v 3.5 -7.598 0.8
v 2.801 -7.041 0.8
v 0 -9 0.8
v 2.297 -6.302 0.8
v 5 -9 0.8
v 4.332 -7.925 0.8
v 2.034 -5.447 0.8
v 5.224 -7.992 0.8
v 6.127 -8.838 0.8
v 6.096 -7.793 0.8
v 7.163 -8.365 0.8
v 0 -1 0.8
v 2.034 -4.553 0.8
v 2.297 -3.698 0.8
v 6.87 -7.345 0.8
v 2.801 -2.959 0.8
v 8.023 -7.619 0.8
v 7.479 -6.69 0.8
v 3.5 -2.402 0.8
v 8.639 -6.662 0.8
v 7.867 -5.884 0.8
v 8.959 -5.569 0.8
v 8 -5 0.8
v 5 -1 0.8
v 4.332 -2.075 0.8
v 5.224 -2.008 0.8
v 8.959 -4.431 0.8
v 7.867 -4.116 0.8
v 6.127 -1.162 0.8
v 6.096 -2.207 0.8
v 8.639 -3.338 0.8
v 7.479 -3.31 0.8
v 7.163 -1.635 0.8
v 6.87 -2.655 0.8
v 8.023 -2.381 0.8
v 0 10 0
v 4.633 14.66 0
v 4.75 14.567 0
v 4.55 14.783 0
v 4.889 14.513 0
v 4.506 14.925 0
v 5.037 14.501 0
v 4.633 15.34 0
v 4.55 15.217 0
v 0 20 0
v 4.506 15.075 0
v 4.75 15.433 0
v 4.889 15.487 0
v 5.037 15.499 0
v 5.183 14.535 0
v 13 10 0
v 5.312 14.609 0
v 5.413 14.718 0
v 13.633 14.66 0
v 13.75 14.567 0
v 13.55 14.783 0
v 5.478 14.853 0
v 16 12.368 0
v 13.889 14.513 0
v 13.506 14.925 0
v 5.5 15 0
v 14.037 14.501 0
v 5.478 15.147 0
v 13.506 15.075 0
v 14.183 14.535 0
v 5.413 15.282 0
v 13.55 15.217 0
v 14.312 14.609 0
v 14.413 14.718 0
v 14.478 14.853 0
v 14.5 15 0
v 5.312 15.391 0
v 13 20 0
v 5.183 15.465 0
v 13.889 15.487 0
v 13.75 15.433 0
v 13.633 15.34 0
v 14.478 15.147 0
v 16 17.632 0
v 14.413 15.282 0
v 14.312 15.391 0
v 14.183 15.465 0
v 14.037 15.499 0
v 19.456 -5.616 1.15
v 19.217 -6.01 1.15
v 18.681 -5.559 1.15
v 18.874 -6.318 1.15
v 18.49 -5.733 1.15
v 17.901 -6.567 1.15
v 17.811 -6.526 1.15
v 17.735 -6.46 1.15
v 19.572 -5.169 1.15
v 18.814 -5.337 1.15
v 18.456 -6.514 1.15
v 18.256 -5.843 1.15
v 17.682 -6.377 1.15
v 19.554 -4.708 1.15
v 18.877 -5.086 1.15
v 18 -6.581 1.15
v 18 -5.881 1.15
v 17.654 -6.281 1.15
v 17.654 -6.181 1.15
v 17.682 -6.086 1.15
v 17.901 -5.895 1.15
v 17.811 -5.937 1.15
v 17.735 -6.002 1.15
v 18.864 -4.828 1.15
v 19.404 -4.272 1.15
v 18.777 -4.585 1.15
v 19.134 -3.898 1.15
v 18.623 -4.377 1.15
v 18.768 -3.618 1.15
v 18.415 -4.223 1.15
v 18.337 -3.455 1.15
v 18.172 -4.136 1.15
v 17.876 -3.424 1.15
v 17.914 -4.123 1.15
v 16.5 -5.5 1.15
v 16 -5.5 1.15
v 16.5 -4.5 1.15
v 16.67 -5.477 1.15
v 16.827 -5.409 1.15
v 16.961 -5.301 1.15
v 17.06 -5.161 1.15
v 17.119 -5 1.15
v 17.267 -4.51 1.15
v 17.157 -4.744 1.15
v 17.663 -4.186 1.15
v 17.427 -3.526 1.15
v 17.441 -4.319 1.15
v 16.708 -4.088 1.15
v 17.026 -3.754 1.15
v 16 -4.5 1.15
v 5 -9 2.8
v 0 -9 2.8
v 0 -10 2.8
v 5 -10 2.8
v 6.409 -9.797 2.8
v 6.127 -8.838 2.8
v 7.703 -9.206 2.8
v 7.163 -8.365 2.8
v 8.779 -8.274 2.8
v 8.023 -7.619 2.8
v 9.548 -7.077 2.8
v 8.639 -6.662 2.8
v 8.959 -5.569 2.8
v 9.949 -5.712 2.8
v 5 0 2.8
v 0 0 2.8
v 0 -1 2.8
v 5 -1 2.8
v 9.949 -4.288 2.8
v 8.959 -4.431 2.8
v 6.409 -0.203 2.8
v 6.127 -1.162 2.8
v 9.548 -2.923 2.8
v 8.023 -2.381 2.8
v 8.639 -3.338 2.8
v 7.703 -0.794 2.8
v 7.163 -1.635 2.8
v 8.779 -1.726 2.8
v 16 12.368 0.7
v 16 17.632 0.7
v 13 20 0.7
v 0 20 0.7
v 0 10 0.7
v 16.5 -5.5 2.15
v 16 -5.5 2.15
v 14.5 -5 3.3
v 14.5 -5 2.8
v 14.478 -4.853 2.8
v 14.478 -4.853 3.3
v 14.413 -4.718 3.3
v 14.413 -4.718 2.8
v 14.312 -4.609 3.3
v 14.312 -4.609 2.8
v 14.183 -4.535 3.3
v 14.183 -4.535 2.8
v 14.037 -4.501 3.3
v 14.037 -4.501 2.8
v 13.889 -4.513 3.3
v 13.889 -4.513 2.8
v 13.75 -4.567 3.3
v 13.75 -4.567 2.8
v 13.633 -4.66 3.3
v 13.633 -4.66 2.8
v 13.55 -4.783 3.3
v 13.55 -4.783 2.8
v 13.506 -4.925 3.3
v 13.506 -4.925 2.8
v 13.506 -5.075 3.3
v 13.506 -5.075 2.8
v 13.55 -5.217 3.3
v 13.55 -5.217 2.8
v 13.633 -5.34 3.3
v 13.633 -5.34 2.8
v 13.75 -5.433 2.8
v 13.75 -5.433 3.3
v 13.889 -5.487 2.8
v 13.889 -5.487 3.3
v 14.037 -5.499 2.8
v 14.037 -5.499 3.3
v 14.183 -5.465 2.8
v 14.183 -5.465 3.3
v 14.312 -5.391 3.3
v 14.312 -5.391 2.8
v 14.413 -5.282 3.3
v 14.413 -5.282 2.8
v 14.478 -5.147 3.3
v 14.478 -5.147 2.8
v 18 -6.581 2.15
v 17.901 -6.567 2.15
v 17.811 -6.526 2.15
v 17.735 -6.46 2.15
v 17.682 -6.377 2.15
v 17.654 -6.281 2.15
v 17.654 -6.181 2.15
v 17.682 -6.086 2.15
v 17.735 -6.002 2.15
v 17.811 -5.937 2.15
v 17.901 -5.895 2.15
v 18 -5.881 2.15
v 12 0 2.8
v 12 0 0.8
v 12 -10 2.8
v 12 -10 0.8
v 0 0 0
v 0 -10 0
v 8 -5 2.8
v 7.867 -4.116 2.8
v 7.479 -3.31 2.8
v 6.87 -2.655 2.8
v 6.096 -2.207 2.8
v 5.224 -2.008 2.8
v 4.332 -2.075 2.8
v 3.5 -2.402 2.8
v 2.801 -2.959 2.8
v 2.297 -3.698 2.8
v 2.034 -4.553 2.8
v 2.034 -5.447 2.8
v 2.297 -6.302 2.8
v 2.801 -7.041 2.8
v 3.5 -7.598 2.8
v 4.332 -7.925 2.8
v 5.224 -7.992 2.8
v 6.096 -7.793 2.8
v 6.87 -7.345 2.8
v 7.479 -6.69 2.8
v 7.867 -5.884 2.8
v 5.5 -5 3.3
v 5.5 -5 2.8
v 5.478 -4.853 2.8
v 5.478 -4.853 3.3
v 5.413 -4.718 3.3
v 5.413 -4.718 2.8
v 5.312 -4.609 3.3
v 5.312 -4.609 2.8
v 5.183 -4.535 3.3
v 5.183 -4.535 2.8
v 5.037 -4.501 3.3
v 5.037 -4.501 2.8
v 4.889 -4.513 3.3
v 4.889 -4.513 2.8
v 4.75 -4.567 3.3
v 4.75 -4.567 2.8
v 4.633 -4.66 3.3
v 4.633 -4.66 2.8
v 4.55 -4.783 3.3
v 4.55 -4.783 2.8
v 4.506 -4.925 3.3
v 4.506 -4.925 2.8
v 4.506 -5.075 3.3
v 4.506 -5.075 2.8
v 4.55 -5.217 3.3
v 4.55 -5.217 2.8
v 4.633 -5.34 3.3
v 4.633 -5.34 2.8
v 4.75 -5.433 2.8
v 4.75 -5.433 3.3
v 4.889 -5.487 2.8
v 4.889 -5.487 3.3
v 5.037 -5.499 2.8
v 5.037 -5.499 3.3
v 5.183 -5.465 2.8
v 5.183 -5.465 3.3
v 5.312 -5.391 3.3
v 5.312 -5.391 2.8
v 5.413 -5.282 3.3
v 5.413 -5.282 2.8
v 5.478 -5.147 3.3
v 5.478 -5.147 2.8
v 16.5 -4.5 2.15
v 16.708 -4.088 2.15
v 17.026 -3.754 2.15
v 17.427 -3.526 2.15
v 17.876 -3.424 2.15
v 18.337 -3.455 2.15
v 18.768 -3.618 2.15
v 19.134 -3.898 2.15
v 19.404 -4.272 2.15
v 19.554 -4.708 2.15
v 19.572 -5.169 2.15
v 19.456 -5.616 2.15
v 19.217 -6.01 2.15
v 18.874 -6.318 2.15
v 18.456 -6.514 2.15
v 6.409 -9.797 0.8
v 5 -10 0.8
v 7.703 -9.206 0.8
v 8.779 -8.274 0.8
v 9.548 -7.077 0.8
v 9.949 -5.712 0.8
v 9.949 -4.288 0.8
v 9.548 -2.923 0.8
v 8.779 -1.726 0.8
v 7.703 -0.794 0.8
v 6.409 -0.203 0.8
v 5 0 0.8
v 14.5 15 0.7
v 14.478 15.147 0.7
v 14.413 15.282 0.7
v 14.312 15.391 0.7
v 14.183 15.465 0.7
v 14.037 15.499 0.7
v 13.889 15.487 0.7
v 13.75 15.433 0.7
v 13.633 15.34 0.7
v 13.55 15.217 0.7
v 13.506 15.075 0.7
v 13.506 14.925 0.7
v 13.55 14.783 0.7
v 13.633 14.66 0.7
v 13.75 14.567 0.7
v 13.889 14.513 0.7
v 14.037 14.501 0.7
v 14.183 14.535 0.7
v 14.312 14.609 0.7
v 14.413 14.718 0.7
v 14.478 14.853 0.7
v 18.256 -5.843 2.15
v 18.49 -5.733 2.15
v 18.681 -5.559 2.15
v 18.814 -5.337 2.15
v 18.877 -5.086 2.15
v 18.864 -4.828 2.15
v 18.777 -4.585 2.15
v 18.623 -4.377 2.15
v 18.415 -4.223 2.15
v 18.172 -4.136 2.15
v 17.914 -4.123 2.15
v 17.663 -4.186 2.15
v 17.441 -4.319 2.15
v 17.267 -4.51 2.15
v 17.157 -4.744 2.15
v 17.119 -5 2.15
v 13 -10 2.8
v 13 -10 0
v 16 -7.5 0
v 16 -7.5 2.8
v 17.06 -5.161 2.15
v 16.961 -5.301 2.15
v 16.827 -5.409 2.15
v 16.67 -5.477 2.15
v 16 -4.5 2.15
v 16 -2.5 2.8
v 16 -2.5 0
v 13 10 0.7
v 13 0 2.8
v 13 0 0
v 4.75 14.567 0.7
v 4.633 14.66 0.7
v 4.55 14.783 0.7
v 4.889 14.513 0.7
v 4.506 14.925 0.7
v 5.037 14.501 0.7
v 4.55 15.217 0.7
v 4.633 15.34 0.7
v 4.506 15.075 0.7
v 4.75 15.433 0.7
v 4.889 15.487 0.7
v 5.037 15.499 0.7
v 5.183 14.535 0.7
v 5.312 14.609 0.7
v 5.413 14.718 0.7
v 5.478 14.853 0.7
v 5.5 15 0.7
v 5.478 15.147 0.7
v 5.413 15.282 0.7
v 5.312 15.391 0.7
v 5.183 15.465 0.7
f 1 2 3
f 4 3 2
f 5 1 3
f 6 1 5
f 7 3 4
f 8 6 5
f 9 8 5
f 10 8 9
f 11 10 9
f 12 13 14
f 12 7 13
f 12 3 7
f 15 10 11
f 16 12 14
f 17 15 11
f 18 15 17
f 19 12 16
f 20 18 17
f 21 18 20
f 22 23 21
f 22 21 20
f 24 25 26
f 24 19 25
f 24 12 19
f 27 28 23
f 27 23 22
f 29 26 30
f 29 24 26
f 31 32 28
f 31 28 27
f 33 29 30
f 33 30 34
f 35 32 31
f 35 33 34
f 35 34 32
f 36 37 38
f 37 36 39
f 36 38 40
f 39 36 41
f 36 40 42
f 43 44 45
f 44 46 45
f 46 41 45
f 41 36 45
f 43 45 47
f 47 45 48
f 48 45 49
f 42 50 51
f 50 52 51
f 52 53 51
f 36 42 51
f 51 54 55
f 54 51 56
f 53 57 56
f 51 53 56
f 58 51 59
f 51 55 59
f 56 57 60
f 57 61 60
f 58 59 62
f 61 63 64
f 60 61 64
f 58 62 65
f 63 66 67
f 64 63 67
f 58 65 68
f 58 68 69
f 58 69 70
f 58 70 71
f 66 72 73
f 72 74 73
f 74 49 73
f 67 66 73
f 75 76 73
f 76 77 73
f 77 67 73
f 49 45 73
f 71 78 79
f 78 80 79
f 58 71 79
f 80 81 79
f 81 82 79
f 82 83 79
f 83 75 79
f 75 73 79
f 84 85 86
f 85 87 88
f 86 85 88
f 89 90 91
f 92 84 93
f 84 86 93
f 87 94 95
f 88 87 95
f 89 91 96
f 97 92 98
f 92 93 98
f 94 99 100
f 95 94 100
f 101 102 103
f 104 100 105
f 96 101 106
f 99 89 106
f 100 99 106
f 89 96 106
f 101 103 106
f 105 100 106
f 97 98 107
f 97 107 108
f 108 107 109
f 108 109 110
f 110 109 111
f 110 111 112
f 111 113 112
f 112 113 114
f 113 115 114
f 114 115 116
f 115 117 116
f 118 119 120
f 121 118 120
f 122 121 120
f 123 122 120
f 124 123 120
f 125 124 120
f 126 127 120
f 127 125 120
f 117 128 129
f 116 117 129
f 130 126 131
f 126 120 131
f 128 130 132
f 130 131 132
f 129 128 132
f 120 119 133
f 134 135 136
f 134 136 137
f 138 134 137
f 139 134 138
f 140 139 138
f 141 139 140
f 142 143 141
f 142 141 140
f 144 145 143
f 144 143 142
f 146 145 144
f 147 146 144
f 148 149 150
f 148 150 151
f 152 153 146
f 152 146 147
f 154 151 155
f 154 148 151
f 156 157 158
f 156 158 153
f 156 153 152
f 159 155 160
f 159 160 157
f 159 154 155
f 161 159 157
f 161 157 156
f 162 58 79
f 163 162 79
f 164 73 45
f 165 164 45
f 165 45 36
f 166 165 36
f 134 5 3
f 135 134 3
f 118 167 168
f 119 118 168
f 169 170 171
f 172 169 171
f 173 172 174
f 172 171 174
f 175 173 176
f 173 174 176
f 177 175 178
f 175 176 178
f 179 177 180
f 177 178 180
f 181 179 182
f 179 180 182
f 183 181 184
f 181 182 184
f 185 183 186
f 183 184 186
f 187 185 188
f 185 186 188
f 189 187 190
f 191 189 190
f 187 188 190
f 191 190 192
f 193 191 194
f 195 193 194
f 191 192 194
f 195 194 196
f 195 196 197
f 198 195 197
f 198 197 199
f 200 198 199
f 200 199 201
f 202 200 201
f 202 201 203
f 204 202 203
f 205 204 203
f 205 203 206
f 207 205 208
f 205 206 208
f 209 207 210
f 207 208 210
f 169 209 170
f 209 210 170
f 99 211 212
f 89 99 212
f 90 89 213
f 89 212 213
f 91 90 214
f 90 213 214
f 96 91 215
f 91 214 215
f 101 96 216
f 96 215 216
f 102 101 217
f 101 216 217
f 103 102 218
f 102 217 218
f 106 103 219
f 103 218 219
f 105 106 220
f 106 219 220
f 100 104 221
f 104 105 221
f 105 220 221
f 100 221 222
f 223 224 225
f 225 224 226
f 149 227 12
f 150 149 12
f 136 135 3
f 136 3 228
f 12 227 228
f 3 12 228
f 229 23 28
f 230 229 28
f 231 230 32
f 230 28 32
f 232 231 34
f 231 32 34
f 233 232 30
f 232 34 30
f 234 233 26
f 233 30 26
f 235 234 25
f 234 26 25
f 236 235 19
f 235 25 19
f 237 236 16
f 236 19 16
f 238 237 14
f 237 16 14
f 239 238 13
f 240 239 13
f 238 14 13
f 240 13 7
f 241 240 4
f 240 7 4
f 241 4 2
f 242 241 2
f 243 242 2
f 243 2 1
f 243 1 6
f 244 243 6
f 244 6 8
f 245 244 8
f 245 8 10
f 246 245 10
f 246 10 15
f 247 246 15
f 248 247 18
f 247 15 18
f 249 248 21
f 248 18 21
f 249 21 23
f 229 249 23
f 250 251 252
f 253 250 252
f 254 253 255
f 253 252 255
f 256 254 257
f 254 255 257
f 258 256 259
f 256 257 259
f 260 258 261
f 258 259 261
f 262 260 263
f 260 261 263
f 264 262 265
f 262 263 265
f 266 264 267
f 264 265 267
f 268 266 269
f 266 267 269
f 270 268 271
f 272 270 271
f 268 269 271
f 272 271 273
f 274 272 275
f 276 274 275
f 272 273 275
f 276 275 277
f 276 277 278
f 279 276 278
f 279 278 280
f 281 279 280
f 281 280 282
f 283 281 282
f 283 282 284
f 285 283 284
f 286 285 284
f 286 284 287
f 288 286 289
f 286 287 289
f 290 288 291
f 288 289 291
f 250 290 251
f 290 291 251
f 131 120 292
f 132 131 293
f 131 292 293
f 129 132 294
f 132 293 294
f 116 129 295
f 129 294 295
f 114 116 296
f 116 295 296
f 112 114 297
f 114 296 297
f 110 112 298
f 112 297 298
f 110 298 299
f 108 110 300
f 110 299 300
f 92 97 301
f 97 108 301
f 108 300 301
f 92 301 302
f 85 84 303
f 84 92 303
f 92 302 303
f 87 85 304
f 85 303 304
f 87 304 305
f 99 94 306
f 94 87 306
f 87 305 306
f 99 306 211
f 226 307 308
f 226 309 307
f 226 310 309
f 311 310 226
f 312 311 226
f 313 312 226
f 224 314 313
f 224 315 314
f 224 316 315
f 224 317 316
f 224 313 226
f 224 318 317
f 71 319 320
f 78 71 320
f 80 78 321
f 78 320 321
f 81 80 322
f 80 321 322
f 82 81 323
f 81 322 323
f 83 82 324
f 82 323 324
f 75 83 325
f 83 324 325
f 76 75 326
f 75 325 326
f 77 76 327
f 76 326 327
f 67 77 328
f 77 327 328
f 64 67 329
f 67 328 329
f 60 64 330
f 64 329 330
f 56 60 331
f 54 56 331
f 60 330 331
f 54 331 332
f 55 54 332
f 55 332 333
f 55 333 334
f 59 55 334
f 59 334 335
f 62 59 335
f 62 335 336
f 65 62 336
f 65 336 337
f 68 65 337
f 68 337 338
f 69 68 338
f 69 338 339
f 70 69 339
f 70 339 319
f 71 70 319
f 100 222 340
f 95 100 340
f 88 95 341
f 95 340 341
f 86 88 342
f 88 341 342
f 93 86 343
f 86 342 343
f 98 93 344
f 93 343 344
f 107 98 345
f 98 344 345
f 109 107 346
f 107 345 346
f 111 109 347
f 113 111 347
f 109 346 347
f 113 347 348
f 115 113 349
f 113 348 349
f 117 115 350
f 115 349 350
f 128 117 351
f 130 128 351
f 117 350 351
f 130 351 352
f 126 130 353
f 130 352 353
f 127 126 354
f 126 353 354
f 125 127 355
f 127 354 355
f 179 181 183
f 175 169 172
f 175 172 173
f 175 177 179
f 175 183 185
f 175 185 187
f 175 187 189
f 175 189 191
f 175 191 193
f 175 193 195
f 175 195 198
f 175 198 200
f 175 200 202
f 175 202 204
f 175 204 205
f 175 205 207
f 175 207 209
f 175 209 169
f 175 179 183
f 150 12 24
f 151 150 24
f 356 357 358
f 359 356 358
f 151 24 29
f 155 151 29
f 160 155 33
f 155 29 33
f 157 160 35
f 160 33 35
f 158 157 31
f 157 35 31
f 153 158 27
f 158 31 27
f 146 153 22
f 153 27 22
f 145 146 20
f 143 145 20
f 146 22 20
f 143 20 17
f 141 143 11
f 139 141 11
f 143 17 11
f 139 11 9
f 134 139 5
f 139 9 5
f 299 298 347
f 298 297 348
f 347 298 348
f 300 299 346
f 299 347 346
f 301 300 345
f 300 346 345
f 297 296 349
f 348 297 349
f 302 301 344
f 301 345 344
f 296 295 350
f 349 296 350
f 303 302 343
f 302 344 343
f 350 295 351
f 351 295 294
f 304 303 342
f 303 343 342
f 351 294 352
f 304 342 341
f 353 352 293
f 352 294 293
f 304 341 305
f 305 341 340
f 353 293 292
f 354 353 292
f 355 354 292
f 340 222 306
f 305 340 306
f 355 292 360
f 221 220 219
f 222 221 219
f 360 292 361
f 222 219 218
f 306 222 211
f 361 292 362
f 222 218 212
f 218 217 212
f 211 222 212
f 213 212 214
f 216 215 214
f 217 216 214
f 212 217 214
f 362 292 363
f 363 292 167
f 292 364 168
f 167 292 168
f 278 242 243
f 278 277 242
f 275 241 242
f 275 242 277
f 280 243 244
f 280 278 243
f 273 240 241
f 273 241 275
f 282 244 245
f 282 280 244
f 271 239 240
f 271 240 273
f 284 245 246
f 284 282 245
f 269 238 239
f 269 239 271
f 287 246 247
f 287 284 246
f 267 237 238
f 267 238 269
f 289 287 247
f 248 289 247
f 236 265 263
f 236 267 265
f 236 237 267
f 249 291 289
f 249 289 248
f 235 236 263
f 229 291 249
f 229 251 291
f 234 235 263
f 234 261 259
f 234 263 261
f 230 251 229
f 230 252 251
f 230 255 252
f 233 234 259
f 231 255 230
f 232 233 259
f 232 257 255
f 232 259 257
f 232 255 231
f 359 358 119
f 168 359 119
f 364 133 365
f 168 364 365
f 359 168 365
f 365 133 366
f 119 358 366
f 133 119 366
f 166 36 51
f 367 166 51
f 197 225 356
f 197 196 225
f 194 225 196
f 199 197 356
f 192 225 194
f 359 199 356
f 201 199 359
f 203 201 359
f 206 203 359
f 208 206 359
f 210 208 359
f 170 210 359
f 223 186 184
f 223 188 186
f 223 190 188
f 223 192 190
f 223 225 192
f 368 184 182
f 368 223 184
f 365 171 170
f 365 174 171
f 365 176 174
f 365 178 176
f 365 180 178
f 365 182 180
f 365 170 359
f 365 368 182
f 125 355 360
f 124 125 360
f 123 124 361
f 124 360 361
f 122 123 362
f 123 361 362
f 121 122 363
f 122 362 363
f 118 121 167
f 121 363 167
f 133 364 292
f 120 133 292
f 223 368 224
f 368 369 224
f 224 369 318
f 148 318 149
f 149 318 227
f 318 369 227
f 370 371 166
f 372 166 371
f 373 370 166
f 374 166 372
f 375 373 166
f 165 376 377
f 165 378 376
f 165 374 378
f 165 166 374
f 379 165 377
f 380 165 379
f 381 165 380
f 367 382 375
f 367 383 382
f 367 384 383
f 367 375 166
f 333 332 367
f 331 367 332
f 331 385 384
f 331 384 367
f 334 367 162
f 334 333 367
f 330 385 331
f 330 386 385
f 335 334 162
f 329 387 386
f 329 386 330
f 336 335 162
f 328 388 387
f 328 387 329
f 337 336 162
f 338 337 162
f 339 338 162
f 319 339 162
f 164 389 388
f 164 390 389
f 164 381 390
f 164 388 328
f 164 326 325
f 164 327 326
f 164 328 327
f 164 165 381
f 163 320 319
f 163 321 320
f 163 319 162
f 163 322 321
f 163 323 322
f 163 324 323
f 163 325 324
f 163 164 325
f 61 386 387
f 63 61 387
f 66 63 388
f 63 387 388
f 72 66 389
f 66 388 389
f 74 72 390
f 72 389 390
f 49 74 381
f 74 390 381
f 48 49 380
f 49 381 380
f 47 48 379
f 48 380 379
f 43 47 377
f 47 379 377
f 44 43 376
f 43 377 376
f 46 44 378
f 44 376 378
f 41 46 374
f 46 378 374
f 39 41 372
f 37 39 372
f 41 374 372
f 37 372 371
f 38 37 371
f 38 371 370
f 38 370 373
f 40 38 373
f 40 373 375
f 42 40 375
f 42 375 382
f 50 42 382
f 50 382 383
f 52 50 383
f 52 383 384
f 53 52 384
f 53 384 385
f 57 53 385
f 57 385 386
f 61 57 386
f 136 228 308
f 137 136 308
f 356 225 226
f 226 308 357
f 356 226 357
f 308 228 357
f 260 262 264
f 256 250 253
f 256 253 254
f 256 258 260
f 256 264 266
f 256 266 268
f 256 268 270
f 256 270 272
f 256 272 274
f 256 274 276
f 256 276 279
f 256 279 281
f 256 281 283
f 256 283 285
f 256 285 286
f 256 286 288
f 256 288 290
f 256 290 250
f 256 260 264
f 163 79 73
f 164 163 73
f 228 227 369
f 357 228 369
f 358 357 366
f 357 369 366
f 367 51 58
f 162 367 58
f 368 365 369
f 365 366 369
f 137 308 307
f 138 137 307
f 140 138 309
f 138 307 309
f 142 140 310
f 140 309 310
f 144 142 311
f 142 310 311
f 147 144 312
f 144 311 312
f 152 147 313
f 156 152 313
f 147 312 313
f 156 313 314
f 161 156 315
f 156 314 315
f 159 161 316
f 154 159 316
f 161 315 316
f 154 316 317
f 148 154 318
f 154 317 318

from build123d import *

# Parameters (mm, degrees)
F1_DEPTH  = 0.8
F2_R      = 3
F3_DEPTH  = 2
F4_R      = 0.5
F5_DEPTH  = 0.5
F6_R      = 0.5
F7_DEPTH  = 0.5
F9_DEPTH  = 5
F11_DEPTH = 25
F13_DEPTH = 0.7
F14_R     = 0.5
F15_DEPTH = 25


with BuildPart() as f1:
    # F0 (on Top) → F1 (new body)
    with BuildSketch(Plane.XY):
        Polygon((13, 0), (0, 0), (0, -10), (13, -10), (16, -7.5), (16, -2.5), align=None)
    extrude(amount=F1_DEPTH)

    # F2 (on face) → F3 (join)
    with BuildSketch(Plane.XY.offset(0.8)):
        with Locations((5, -5)):
            Circle(F2_R)
        Polygon((13, -10), (16, -7.5), (16, -2.5), (13, 0), (12, 0), (12, -10), align=None)
        with BuildLine():
            ThreePointArc((5, -10), (10, -5), (5, 0))
            Line((5, 0), (0, 0))
            Line((0, 0), (0, -1))
            Line((0, -1), (5, -1))
            ThreePointArc((5, -1), (9, -5), (5, -9))
            Line((5, -9), (0, -9))
            Line((0, -9), (0, -10))
            Line((0, -10), (5, -10))
        make_face()
    extrude(amount=F3_DEPTH)

    # F4 (on face) → F5 (join)
    with BuildSketch(Plane.XY.offset(2.8)):
        with Locations((5, -5)):
            Circle(F4_R)
    extrude(amount=F5_DEPTH)

    # F6 (on face) → F7 (join)
    with BuildSketch(Plane.XY.offset(2.8)):
        with Locations((14, -5)):
            Circle(F6_R)
    extrude(amount=F7_DEPTH)

    # F8 (on face) → F9 (join)
    with BuildSketch(Plane.YZ.offset(16)):
        Polygon((-7.5, 2.15), (-7.5, 1.65), (-7.5, 1.15), (-2.5, 1.15), (-2.5, 2.15), align=None)
    extrude(amount=F9_DEPTH)

    # F10 (on face) → F11 (cut)
    with BuildSketch(Plane.XY.offset(2.15)):
        with BuildLine():
            Line((16, -2.5), (16, -4.5))
            Line((16, -4.5), (16.5, -4.5))
            ThreePointArc((16.5, -4.5), (19.282687, -4.075492), (18, -6.581139))
            ThreePointArc((18, -6.581139), (17.65, -6.231139), (18, -5.881139))
            ThreePointArc((18, -5.881139), (18.623059, -4.376941), (17.118861, -5))
            ThreePointArc((17.118861, -5), (16.897803, -5.359381), (16.5, -5.5))
            Line((16.5, -5.5), (16, -5.5))
            Line((16, -5.5), (16, -7.5))
            Line((16, -7.5), (21, -7.5))
            Line((21, -7.5), (21, -2.5))
            Line((21, -2.5), (16, -2.5))
        make_face()
    extrude(amount=-F11_DEPTH, mode=Mode.SUBTRACT)


with BuildPart() as f13:
    # F12 (on Top) → F13 (new body)
    with BuildSketch(Plane.XY):
        Polygon((0, 20), (0, 10), (13, 10), (16, 12.368282), (16, 17.631718), (13, 20), align=None)
    extrude(amount=F13_DEPTH)

    # F14 (on face) → F15 (cut)
    with BuildSketch(Plane.XY.offset(0.7)):
        with Locations((5, 15)):
            Circle(F14_R)
        with Locations((14, 15)):
            Circle(F14_R)
    extrude(amount=-F15_DEPTH, mode=Mode.SUBTRACT)


solid = Compound([f1.part, f13.part])
